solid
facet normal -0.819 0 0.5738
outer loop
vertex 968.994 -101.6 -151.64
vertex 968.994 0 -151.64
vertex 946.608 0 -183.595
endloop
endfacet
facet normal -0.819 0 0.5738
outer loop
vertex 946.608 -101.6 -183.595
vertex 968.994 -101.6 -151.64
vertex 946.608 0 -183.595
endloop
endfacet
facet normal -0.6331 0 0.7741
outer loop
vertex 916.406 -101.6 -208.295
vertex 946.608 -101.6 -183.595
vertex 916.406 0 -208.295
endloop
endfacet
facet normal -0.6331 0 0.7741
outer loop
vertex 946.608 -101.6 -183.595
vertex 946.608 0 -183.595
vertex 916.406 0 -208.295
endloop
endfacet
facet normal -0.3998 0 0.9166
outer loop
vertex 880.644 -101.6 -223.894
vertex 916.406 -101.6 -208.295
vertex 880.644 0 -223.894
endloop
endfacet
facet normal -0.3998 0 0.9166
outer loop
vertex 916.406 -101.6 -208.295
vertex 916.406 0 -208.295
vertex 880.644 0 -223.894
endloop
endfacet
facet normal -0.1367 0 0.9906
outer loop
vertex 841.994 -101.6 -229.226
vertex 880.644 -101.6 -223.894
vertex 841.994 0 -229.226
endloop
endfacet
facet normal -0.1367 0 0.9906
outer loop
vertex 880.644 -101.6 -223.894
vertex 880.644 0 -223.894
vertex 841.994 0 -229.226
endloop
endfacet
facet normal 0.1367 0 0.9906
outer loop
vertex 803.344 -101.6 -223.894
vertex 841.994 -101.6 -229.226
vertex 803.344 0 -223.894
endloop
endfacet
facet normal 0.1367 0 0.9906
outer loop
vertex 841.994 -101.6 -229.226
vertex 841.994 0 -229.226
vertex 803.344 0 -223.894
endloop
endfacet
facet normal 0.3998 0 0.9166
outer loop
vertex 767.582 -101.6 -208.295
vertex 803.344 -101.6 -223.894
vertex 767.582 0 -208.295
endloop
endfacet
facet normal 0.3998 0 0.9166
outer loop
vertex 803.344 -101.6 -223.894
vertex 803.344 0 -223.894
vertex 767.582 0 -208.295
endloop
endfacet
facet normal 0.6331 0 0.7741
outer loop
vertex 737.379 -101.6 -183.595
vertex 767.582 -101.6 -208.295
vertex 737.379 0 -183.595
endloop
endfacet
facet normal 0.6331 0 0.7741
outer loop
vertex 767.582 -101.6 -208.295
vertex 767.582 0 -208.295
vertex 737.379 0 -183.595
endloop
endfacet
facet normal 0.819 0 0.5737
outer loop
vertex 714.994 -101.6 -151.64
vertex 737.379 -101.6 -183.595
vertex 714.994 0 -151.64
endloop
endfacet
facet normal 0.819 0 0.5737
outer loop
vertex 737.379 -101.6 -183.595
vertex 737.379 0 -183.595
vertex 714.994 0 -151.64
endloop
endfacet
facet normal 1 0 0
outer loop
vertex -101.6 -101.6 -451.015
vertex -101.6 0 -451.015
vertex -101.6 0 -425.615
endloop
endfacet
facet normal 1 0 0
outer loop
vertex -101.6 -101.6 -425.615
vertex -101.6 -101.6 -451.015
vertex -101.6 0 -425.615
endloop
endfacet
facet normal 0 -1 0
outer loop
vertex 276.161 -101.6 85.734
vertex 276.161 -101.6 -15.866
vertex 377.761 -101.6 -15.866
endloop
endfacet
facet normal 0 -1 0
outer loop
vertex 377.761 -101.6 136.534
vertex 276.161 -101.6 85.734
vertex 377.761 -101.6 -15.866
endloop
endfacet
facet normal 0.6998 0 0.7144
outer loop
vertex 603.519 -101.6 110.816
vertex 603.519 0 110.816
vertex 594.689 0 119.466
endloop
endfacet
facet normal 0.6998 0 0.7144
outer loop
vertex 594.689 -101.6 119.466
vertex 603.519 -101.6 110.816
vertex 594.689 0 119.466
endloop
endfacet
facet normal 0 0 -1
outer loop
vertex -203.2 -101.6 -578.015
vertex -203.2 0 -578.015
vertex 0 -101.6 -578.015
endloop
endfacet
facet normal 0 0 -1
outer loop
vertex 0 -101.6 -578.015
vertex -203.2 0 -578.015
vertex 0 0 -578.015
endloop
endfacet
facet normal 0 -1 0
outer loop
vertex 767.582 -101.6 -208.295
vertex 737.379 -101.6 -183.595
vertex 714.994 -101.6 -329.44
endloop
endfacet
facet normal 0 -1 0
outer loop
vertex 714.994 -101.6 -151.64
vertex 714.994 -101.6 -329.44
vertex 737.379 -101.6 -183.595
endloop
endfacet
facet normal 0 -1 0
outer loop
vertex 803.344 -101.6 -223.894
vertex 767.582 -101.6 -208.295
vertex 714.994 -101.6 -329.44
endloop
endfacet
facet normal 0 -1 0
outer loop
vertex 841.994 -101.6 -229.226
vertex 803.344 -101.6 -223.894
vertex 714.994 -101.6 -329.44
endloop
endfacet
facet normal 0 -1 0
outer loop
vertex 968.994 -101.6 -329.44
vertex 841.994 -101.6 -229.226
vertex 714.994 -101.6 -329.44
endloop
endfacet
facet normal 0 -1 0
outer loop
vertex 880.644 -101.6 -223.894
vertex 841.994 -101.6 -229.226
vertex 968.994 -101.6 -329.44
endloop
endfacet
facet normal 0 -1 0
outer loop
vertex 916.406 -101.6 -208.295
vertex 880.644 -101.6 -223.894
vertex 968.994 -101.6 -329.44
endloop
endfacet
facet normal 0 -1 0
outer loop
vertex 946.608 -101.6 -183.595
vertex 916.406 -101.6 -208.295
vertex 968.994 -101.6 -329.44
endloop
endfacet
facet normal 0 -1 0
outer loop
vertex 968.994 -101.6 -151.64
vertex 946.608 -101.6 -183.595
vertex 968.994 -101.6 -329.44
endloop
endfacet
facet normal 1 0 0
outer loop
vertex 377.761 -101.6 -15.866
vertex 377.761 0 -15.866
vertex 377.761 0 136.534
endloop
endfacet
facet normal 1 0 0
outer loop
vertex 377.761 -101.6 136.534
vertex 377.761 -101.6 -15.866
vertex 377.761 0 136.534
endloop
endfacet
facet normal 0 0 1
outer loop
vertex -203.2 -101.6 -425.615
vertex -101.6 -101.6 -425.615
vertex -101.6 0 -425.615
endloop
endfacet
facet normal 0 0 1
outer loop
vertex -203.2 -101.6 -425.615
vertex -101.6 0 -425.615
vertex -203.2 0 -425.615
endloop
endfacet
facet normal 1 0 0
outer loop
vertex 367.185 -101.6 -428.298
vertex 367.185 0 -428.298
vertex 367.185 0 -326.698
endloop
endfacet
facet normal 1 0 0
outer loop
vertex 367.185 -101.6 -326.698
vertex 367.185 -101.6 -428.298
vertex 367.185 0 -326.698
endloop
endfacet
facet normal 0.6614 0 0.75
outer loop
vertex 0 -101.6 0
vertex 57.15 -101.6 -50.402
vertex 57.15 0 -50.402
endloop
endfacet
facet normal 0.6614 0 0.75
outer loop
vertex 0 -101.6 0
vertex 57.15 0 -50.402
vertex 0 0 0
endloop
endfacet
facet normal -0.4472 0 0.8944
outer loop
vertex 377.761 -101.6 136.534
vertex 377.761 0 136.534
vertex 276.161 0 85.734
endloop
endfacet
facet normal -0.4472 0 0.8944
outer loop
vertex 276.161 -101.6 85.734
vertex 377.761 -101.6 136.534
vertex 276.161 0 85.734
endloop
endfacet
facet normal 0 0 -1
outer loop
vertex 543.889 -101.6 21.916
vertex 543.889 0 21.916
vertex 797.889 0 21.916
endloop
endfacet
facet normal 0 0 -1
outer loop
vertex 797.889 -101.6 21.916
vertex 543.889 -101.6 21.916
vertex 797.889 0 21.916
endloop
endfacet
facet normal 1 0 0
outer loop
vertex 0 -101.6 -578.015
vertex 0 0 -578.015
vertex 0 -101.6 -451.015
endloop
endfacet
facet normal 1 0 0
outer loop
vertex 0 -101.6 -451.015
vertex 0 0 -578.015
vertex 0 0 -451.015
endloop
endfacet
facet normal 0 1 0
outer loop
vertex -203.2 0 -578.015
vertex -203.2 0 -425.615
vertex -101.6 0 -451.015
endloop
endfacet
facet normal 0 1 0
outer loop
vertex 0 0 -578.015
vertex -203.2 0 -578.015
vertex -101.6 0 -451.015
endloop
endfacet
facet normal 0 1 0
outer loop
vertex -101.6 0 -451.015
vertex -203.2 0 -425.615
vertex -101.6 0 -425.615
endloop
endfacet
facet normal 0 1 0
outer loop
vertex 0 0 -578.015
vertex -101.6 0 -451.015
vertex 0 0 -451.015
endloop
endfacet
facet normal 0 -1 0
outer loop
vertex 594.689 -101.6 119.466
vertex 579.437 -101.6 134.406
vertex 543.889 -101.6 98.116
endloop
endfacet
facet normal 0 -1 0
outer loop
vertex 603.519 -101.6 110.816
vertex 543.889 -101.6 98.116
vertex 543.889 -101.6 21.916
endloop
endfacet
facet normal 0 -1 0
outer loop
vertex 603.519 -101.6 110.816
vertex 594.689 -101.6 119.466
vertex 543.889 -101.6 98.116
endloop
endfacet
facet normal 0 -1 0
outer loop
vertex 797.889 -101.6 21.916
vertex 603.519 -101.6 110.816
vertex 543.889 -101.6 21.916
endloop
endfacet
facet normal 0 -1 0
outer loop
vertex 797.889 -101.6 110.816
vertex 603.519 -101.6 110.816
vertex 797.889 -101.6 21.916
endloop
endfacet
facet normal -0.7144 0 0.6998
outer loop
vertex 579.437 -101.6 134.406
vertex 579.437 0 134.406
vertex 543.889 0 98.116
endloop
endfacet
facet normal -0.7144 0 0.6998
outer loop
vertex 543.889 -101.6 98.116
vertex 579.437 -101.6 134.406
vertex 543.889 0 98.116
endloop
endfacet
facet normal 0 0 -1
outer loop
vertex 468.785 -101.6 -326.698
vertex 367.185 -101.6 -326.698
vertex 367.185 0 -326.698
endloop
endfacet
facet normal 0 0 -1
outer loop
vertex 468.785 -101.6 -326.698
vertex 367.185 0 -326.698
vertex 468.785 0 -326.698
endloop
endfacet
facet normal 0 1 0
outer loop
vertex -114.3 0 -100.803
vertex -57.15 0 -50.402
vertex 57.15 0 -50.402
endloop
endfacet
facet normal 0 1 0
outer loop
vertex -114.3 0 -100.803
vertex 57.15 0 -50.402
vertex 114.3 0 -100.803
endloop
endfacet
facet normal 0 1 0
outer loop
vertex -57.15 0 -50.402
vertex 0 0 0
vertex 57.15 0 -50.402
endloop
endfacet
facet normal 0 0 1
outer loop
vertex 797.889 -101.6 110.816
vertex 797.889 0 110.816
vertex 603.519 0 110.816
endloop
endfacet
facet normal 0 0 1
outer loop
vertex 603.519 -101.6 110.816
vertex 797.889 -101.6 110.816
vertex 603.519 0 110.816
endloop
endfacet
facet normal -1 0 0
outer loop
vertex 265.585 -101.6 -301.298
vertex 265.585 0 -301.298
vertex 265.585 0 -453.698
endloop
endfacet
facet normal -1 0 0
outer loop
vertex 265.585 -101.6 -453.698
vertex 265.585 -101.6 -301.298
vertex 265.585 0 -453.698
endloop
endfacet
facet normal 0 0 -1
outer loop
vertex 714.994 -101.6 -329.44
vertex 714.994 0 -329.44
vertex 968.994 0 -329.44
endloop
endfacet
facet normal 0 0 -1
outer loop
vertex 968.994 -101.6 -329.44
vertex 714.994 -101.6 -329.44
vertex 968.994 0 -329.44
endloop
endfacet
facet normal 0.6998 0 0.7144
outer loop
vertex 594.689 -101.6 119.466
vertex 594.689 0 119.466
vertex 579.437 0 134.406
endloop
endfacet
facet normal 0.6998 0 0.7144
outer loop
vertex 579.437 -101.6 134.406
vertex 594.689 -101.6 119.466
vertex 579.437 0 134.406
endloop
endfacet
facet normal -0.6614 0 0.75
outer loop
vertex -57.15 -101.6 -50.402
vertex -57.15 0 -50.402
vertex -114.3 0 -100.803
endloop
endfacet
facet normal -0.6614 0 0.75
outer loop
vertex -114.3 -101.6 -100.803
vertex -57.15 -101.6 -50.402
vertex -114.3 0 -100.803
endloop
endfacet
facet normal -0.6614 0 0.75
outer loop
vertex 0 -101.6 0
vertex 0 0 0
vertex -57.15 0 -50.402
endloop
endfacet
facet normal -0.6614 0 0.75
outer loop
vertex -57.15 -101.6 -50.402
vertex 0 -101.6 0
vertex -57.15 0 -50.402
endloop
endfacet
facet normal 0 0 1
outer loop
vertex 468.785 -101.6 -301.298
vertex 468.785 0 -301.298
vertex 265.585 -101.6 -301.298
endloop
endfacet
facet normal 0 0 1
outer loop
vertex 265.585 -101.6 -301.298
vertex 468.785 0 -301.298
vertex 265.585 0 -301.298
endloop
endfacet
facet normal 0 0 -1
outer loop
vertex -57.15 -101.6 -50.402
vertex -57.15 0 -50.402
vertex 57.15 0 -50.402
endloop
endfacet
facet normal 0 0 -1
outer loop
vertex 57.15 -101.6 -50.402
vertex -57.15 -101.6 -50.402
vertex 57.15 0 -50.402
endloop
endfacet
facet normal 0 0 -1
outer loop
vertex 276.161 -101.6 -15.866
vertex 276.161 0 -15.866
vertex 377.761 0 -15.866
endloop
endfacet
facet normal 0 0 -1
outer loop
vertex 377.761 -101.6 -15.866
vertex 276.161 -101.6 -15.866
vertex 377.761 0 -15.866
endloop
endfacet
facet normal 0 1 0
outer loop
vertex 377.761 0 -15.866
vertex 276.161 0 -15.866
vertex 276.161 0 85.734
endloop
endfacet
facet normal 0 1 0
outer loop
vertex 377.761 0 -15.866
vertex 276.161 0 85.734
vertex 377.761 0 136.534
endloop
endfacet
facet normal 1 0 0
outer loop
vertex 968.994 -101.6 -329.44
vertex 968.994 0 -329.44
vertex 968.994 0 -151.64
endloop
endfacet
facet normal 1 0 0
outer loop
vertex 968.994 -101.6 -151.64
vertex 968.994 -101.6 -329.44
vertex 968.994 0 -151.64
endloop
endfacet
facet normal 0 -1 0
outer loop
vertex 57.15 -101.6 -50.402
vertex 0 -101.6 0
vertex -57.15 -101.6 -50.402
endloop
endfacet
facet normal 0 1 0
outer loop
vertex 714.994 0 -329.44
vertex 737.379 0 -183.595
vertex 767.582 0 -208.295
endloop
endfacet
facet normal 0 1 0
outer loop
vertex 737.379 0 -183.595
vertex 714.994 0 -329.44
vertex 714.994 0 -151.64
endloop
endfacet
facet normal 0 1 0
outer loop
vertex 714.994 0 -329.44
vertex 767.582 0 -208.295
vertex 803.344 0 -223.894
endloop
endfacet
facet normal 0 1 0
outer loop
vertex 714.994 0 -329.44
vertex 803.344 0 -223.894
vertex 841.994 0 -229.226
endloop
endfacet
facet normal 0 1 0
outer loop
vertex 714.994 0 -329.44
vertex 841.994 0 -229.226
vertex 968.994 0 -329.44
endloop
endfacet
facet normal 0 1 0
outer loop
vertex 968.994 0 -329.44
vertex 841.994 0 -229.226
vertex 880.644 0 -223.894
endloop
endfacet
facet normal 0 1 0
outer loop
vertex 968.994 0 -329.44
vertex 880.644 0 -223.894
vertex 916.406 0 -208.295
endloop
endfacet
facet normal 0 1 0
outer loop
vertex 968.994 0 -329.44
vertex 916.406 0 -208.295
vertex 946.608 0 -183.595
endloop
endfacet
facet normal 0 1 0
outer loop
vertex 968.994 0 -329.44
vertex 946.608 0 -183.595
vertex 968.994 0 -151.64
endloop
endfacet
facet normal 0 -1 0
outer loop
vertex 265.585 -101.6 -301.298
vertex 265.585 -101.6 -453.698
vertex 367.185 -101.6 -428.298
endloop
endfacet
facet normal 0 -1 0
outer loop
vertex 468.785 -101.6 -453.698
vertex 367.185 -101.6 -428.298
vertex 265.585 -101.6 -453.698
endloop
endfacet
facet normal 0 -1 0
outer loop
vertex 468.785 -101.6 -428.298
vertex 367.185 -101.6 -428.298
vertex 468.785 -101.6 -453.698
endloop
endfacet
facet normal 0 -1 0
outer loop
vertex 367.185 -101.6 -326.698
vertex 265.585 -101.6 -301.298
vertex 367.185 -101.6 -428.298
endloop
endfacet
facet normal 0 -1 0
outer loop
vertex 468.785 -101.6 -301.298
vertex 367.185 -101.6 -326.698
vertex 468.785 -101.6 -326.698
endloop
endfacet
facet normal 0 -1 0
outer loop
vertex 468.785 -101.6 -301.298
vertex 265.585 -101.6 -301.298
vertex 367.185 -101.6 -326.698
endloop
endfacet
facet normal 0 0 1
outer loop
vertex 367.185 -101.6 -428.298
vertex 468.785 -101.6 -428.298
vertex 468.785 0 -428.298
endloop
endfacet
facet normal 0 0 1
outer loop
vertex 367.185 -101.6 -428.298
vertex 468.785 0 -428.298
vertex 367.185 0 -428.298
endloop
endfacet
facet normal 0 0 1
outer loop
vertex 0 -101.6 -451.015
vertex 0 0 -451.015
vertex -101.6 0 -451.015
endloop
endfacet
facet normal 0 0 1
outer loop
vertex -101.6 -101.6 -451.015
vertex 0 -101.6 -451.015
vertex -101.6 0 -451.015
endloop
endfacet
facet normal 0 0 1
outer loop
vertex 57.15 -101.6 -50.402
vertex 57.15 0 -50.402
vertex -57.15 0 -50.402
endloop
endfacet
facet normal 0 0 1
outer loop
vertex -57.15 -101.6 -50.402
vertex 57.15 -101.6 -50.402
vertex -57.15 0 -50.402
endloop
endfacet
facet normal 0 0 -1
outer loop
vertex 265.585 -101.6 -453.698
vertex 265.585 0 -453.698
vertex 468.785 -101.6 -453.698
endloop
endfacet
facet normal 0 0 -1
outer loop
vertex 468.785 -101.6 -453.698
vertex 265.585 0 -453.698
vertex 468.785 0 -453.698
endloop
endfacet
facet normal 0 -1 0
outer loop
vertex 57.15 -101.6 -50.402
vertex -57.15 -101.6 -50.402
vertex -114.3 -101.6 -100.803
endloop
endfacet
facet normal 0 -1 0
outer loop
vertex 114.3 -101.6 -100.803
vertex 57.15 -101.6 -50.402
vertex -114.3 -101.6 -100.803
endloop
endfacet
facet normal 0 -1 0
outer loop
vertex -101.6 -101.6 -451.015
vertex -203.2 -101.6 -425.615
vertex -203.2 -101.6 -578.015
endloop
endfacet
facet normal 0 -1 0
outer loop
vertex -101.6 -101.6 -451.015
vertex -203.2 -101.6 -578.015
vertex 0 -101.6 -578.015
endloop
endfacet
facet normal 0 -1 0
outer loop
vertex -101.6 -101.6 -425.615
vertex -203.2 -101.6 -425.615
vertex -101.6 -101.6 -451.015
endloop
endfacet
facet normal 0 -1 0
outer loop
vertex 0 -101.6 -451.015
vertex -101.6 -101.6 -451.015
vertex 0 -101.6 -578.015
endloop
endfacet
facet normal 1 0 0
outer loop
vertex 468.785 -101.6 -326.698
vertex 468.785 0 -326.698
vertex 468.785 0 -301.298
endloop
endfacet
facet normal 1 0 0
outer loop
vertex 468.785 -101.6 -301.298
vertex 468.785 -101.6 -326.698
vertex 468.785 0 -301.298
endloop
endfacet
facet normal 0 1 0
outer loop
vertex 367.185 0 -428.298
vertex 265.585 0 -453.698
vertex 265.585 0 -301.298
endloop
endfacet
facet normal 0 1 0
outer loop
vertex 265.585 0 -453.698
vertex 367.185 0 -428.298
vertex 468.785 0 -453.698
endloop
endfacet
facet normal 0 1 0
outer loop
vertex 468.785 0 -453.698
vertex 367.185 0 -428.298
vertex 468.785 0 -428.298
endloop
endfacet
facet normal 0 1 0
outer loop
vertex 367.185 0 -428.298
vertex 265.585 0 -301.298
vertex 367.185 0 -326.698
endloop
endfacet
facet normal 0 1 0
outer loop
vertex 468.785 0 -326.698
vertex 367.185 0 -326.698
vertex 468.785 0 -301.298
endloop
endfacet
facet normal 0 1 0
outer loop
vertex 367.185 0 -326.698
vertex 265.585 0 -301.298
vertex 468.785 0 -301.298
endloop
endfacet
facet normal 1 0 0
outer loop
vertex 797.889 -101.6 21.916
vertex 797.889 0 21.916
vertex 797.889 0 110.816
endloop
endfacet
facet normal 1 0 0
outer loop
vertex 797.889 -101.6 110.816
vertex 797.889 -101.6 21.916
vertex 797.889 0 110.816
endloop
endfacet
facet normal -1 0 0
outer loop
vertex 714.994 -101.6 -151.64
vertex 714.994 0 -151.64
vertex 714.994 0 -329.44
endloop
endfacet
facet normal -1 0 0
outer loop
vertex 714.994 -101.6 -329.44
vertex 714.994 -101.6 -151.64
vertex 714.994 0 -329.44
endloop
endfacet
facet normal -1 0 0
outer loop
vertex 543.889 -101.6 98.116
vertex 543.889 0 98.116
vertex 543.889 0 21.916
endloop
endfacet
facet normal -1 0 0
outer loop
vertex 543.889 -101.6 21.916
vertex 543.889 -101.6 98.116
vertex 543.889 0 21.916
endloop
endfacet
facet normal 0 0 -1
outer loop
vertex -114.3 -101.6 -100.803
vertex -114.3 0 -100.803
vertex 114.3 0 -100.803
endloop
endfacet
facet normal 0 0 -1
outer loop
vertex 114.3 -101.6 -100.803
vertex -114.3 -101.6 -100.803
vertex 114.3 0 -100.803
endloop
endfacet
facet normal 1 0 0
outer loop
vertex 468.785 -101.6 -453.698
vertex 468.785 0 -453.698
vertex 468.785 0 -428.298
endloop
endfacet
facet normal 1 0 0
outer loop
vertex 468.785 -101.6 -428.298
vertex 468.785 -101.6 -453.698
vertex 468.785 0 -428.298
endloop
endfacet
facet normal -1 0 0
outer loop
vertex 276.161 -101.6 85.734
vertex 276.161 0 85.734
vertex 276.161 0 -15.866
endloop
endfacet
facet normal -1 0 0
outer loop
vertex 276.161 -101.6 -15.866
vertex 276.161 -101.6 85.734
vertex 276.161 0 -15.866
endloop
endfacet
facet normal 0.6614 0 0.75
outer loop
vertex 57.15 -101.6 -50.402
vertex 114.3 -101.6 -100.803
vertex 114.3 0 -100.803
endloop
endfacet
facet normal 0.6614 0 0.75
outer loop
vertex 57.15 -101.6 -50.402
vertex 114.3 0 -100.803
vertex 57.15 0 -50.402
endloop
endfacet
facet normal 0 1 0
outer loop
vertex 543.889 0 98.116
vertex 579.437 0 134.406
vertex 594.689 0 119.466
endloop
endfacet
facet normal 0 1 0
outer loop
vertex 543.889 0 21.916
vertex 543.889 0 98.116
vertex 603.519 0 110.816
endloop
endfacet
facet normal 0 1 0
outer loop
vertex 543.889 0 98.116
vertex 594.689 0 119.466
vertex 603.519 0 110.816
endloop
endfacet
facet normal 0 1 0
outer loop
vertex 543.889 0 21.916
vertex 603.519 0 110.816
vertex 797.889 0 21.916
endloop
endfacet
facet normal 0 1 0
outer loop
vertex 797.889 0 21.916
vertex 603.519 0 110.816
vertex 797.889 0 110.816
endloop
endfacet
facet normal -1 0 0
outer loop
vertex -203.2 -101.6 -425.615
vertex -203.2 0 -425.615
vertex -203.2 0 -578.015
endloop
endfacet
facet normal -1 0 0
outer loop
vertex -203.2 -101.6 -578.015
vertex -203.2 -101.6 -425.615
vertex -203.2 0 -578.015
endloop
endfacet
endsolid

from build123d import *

# Parameters (mm, degrees)
F2_DEPTH  = 101.6
F4_DEPTH  = 101.6
F6_DEPTH  = 101.6
F8_DEPTH  = 101.6
F10_DEPTH = 101.6


with BuildPart() as f2:
    # F0 (on Front) → F2 (new body)
    with BuildSketch(Plane.XZ):
        Polygon((57.15, -50.4015624758), (0, 0), (-57.15, -50.4015624758), align=None)
    extrude(amount=F2_DEPTH)


with BuildPart() as f2b:
    # F1 (on face) → F2, piece 2 (new body)
    with BuildSketch(Plane.XZ):
        Polygon((114.3, -100.8031249516), (57.15, -50.4015624758), (-57.15, -50.4015624758), (-114.3, -100.8031249516), align=None)
    extrude(amount=F2_DEPTH)


with BuildPart() as f4:
    # F3 (on Front) → F4 (new body)
    with BuildSketch(Plane.XZ):
        Polygon((377.7606872082, -15.8657720208), (377.7606872082, 136.5342279792), (276.1606872082, 85.7342279792), (276.1606872082, -15.8657720208), align=None)
    extrude(amount=F4_DEPTH)


with BuildPart() as f4b:
    # F3 (on Front) → F4, piece 2 (new body)
    with BuildSketch(Plane.XZ):
        Polygon((543.8886880875, 98.1160318375), (543.8886880875, 21.9160318375), (594.6886880875, 21.9160318375), (594.6886880875, 72.7160318375), (594.6886880875, 119.4656812943), (579.4372981796, 134.4056490925), align=None)
        Polygon((603.5186386078, 110.8160318375), (642.4128292338, 72.7160318375), (797.8886880875, 72.7160318375), (797.8886880875, 110.8160318375), align=None)
        Polygon((594.6886880875, 72.7160318375), (594.6886880875, 21.9160318375), (645.4886880875, 21.9160318375), (797.8886880875, 21.9160318375), (797.8886880875, 72.7160318375), (642.4128292338, 72.7160318375), align=None)
        Polygon((594.6886880875, 119.4656812943), (594.6886880875, 72.7160318375), (642.4128292338, 72.7160318375), (603.5186386078, 110.8160318375), align=None)
    extrude(amount=F4_DEPTH)


with BuildPart() as f6:
    # F5 (on Front) → F6 (new body)
    with BuildSketch(Plane.XZ):
        Polygon((-101.6, -425.6145358086), (-203.2, -425.6145358086), (-203.2, -578.0145358086), (0, -578.0145358086), (0, -451.0145358086), (-101.6, -451.0145358086), align=None)
    extrude(amount=F6_DEPTH)


with BuildPart() as f8:
    # F7 (on Front) → F8 (new body)
    with BuildSketch(Plane.XZ):
        Polygon((468.7846178532, -301.2978369474), (265.5846178532, -301.2978369474), (265.5846178532, -453.6978369474), (468.7846178532, -453.6978369474), (468.7846178532, -428.2978369474), (367.1846178532, -428.2978369474), (367.1846178532, -326.6978369474), (468.7846178532, -326.6978369474), align=None)
    extrude(amount=F8_DEPTH)


with BuildPart() as f10:
    # F9 (on Front) → F10 (new body)
    with BuildSketch(Plane.XZ):
        with BuildLine():
            ThreePointArc((968.9937152863, -151.64017663), (841.9937152863, -229.2261491845), (714.9937152863, -151.64017663))
            Line((714.9937152863, -151.64017663), (714.9937152863, -329.44017663))
            Line((714.9937152863, -329.44017663), (968.9937152863, -329.44017663))
            Line((968.9937152863, -329.44017663), (968.9937152863, -151.64017663))
        make_face()
    extrude(amount=F10_DEPTH)


solid = Compound([f2.part, f2b.part, f4.part, f4b.part, f6.part, f8.part, f10.part])
